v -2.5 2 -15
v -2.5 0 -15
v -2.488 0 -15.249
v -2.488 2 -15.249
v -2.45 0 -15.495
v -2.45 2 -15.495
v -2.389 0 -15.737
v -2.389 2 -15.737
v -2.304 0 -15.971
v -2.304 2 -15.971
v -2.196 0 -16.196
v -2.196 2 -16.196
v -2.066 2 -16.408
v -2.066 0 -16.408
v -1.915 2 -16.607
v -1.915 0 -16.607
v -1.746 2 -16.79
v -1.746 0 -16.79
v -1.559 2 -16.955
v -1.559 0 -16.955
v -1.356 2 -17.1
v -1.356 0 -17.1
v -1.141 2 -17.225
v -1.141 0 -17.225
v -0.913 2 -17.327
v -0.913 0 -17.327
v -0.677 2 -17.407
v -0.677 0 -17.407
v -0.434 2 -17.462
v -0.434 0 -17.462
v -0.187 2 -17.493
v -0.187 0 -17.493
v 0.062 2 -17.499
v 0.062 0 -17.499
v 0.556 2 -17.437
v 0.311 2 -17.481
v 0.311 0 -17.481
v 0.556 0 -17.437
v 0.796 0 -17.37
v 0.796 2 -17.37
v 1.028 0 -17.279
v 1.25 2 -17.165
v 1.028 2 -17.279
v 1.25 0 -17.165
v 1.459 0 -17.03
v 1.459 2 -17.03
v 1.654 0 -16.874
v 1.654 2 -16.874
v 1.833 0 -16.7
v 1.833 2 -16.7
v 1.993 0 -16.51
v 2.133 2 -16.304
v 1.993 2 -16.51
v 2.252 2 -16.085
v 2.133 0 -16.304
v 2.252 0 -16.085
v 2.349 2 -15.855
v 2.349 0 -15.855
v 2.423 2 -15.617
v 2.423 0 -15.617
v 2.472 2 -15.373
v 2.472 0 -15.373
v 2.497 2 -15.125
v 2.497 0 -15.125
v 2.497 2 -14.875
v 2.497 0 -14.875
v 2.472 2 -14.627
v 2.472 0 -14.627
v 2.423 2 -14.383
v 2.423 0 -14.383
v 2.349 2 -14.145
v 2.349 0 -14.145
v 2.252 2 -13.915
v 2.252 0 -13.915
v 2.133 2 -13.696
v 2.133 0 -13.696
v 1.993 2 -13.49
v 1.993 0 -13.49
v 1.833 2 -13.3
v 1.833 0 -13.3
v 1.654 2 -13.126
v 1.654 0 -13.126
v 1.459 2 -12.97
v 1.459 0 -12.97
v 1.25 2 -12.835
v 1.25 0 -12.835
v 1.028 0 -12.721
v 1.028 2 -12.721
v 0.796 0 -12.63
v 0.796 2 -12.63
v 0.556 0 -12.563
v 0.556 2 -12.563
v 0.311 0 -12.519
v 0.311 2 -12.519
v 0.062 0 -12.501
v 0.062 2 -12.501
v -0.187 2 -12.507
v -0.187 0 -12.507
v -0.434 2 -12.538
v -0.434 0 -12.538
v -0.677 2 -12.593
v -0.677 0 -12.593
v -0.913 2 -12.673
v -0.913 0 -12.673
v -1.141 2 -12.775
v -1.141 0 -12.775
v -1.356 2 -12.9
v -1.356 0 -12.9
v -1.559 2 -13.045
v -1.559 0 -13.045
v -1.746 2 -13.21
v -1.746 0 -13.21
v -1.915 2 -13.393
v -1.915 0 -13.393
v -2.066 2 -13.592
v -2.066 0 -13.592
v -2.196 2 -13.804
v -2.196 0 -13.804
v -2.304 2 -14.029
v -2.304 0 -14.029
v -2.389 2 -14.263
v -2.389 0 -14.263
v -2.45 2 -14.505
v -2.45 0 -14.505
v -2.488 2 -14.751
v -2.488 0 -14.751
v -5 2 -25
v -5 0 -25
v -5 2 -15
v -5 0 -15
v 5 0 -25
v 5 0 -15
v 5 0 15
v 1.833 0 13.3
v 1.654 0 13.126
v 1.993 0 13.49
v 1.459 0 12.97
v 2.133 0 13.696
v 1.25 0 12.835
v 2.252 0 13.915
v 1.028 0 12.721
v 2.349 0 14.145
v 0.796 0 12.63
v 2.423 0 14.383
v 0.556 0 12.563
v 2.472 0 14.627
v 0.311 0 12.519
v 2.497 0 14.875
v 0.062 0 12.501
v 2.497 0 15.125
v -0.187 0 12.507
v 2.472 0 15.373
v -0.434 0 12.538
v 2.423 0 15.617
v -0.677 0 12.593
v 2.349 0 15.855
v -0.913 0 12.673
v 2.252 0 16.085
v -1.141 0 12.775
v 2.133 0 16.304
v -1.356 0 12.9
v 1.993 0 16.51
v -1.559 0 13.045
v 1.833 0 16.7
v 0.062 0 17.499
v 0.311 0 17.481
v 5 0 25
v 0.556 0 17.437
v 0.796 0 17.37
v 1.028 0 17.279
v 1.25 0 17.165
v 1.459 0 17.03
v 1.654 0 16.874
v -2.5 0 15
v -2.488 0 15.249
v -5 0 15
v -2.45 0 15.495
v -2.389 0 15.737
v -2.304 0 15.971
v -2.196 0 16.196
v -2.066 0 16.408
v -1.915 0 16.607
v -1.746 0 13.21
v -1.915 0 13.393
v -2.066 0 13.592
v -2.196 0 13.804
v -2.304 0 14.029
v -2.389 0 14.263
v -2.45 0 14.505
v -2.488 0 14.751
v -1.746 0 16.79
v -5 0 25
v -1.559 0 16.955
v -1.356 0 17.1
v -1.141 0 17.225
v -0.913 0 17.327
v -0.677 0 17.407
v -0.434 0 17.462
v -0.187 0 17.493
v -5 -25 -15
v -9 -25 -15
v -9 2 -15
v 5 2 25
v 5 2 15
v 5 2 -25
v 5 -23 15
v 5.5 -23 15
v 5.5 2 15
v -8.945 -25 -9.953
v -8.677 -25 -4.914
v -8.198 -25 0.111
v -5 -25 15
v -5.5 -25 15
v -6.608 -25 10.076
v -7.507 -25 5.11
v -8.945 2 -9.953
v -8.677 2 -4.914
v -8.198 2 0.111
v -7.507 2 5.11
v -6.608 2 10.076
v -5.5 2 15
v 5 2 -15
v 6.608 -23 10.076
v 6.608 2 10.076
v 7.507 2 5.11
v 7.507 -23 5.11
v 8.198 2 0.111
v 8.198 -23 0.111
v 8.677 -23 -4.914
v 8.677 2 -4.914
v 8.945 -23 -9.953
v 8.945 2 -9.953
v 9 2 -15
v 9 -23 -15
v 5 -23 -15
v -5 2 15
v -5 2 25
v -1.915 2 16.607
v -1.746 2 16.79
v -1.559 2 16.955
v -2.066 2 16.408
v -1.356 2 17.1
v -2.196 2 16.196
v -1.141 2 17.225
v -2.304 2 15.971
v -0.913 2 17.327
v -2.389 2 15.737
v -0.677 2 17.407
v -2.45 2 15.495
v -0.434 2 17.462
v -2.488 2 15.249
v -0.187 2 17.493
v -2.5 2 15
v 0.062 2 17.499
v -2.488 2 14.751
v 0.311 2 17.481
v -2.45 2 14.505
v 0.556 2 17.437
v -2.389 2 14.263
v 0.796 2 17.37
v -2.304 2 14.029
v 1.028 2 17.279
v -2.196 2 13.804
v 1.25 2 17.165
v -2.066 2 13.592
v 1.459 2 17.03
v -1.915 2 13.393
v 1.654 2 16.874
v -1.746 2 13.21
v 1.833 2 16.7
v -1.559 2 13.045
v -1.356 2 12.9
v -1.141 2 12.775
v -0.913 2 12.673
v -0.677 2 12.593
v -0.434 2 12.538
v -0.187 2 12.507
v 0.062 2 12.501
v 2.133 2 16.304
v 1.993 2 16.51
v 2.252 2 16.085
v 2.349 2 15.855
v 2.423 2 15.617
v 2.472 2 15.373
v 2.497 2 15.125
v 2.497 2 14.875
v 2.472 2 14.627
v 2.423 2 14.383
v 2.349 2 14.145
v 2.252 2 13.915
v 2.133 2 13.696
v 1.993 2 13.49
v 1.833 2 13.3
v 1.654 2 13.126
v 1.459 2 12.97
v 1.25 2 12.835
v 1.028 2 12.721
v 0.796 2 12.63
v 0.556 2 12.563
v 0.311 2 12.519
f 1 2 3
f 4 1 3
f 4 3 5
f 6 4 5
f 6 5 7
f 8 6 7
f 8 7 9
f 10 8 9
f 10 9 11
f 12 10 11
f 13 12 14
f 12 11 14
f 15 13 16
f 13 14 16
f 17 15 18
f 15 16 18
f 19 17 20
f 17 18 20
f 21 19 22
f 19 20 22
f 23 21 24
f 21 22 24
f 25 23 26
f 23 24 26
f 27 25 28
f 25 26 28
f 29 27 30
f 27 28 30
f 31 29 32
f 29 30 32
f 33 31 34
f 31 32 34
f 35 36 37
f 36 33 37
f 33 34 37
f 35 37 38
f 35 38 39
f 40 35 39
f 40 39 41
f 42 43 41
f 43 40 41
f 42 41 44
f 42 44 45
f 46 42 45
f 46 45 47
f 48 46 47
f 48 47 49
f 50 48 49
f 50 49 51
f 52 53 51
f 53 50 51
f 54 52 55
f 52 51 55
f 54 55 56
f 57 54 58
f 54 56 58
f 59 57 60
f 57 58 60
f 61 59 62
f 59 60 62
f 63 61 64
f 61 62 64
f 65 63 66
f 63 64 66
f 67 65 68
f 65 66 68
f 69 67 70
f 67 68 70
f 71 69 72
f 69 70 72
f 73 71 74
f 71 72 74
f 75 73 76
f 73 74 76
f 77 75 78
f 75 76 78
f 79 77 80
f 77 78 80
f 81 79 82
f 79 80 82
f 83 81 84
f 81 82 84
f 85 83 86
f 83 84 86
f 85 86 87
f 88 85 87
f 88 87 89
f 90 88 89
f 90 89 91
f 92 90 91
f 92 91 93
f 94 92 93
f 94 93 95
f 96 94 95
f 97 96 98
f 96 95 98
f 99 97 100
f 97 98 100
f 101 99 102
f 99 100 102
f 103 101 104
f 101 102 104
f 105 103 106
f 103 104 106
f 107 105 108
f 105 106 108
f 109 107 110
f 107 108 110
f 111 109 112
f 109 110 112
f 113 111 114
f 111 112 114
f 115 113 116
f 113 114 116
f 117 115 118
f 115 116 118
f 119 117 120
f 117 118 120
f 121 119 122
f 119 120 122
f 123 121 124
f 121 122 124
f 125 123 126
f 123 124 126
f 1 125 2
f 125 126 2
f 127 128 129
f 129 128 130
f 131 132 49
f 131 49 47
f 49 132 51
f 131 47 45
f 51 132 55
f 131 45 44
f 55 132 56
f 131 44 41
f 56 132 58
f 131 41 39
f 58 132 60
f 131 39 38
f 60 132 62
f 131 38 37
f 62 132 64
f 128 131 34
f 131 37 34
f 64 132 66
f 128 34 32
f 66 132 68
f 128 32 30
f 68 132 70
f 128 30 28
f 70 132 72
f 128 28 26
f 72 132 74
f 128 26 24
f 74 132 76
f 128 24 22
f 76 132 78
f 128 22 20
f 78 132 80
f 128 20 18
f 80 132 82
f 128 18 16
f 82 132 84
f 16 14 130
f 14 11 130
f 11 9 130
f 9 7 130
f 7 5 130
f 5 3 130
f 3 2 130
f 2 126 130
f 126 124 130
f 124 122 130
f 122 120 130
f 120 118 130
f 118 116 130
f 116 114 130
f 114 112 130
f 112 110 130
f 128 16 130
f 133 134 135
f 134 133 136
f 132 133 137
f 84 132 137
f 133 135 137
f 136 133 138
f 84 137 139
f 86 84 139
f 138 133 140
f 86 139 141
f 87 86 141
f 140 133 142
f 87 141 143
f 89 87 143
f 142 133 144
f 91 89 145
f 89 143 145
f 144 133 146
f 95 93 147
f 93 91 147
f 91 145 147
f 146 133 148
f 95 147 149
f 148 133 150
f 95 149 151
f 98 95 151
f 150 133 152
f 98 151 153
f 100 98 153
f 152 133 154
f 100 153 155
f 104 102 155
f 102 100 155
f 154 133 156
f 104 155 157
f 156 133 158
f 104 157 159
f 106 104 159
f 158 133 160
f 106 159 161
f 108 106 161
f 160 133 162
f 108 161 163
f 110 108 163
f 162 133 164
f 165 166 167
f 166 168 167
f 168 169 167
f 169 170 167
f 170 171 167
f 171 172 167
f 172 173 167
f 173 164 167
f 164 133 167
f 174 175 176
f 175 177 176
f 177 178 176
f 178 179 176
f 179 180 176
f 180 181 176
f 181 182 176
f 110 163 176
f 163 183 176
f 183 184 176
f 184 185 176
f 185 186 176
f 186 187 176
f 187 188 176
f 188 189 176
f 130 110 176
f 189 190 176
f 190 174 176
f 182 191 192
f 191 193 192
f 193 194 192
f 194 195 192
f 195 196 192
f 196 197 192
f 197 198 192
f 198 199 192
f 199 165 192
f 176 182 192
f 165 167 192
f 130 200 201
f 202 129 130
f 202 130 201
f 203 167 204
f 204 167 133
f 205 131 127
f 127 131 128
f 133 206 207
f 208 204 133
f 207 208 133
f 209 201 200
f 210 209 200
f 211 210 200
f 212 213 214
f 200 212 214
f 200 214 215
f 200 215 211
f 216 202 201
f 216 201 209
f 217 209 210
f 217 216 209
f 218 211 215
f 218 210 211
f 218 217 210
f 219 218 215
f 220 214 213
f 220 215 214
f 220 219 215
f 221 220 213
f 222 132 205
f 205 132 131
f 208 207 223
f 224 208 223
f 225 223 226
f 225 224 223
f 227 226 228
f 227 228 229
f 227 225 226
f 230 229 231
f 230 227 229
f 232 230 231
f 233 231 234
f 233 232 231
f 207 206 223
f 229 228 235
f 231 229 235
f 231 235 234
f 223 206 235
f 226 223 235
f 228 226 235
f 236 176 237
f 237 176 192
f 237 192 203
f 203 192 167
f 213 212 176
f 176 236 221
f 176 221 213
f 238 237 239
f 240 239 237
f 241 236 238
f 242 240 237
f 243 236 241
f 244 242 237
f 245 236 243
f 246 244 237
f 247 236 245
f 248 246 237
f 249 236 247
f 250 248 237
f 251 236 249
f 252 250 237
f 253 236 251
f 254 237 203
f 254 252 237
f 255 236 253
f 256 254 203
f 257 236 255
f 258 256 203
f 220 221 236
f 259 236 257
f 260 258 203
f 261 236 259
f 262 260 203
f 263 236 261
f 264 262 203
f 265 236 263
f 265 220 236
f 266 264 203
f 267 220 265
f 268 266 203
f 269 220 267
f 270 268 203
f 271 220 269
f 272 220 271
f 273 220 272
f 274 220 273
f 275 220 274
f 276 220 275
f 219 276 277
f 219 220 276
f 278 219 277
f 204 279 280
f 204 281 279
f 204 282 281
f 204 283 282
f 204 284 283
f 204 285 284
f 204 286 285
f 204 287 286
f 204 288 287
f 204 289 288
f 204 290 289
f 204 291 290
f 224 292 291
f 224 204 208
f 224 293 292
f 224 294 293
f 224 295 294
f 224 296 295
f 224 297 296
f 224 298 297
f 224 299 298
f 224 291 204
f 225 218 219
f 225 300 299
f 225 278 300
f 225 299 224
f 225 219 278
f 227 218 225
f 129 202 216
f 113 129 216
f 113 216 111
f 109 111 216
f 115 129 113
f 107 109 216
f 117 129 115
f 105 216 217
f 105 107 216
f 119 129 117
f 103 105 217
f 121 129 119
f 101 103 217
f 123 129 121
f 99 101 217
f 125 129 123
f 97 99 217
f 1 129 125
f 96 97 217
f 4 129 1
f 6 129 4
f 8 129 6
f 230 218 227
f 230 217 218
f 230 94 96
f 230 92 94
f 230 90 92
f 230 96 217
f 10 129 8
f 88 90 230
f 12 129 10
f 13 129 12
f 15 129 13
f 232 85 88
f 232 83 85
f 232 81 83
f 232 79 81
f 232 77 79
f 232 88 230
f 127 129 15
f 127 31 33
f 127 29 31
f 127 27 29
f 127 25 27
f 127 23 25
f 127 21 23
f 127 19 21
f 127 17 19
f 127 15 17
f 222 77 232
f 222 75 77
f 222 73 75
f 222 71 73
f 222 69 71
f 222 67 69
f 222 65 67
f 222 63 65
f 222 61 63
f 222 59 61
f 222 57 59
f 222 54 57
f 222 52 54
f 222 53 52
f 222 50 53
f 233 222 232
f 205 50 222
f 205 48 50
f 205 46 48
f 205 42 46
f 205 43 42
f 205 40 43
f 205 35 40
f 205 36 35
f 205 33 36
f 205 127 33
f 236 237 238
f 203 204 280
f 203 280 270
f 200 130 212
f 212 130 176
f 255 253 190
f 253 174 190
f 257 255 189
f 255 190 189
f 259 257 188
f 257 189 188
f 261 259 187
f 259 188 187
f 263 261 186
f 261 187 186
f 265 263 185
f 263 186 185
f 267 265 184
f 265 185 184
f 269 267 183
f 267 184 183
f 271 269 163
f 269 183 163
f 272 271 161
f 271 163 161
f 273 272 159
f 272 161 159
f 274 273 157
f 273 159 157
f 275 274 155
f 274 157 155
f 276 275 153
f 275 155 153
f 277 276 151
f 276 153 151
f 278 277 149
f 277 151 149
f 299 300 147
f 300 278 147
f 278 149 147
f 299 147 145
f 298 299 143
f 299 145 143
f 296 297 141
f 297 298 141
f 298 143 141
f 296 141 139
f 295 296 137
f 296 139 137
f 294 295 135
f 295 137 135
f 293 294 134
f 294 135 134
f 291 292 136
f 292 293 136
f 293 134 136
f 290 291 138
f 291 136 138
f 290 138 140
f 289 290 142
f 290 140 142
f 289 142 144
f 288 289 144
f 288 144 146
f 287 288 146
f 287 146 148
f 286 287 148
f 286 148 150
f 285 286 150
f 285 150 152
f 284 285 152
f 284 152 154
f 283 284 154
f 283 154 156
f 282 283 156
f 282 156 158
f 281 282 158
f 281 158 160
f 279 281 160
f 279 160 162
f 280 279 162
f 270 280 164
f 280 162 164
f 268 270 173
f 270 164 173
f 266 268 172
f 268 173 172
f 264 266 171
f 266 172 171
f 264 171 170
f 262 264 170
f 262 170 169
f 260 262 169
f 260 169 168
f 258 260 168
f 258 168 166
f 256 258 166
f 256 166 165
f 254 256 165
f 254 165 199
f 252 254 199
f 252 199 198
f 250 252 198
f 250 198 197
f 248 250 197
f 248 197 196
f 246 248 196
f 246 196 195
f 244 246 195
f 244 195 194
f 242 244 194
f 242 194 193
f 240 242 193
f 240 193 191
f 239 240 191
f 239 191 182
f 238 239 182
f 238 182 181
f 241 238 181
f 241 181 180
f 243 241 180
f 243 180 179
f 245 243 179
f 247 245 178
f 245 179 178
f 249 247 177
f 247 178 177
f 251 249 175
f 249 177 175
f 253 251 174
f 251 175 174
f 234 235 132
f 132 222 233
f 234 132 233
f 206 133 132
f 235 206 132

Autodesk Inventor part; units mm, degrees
ref_plane "YZ Plane" through (0, 0, 0) normal (1, 0, 0) x (0, 1, 0)
ref_plane "XZ Plane" through (0, 0, 0) normal (0, 1, 0) x (-1, 0, 0)
ref_plane "XY Plane" through (0, 0, 0) normal (0, 0, 1) x (1, 0, 0)
sketch "Sketch1" plane through (0, 0, 0) normal (0, 1, 0) x (-1, 0, 0)
  line L0 (5, 25) -> (-5, 25)
  line L1 (-5, 25) -> (-5, -25)
  line L2 (-5, -25) -> (5, -25)
  line L3 (5, -25) -> (5, 25)
  line L4 (5, 25) -> (-5, -25) construction
  line L5 (-5, 25) -> (5, -25) construction
  circle A0 centre (0, 15) radius 2.5
  circle A1 centre (0, -15) radius 2.5
  point P0 (0, 0)
  point P1 (0, 25)
  dimension "d0" = 10
  dimension "d1" = 50
  dimension "d2" = 5
  dimension "d3" = 5
  dimension "d4" = 30
  dimension "d5" = 10
  dimension "d6" = 5
  dimension "d7" = 5
extrude "Extrusion1" add sketch "Sketch1" along normal blind 2
sketch "Sketch2" plane through (0, 0, 0) normal (0, -1, 0) x (1, 0, 0)
  line L0 (-5, -15) -> (-9, -15)
  line L1 (-5, 15) -> (-5.5, 15)
  circle A0 centre (0, -15) radius 2.5 projected
  circle A1 centre (0, 15) radius 2.5 projected
  arc A2 (-5.5, 15) -> (-9, -15) centre (110.994, -13.7951) ccw
  line L2 (-5, -15) -> (-5, 15)
  line L3 (-5, -25) -> (-5, 25) projected
  point P0 (0, 0)
  point P1 (-4, -14.9499)
  point P2 (-3, -15)
  dimension "d10" = 0
  dimension "d11" = 0
  dimension "d12" = 4
  dimension "d13" = 0.5
  dimension "d14" = 120
  dimension "d15" = 0
  dimension "d16" = 0
  dimension "d17" = 0
extrude "Extrusion2" add sketch "Sketch2" along normal blind 25 and the other way blind 2 contours L0 A2 L1 L2
sketch "Sketch3" plane through (0, 2, 0) normal (0, 1, 0) x (1, 0, 0)
  line L0 (5, -25) -> (5, 25) projected
  line L1 (5, 15) -> (9, 15)
  line L2 (5, -15) -> (5.5, -15)
  line L3 (5, -15) -> (5, 15)
  circle A0 centre (0, 15) radius 2.5 projected
  circle A1 centre (0, -15) radius 2.5 projected
  arc A2 (5.5, -15) -> (9, 15) centre (-110.994, 13.7951) ccw
  point P0 (0, 0)
  dimension "d22" = 0
  dimension "d23" = 0
  dimension "d24" = 0.5
  dimension "d25" = 4
  dimension "d26" = 120
extrude "Extrusion3" add sketch "Sketch3" against normal blind 25 contours L0 L1 A2 L2
properties part number "squeezer"
